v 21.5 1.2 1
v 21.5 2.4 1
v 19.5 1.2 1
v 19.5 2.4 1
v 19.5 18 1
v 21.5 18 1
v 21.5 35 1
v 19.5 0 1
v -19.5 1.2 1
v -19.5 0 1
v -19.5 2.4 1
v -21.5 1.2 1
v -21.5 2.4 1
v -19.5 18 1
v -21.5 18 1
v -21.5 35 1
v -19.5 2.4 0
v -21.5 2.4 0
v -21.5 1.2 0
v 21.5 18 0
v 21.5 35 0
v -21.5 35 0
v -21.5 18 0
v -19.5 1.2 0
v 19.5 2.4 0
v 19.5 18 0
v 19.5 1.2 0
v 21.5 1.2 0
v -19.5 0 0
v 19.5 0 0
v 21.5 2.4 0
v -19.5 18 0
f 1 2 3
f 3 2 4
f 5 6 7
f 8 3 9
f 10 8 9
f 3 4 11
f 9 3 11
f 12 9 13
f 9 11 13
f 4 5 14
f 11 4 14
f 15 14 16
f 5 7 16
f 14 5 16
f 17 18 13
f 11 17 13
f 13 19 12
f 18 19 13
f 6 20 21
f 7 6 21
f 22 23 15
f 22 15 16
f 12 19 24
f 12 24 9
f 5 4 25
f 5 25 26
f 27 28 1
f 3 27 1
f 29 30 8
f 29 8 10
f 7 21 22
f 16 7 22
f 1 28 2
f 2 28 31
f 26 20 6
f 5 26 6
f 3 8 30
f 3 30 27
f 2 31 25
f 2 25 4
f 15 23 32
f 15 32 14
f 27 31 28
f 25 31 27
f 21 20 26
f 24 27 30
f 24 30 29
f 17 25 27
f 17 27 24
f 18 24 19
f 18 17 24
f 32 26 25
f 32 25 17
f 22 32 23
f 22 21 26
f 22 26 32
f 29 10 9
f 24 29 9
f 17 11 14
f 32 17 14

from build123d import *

# Parameters (mm, degrees)
SKETCH037_W     = 21.5
SKETCH037_H     = 35
PAD014_DEPTH    = 1
SKETCH038_W     = 1.2
SKETCH038_H     = 1
SKETCH038_W_2   = 15.6
POCKET024_DEPTH = 2


with BuildPart() as part:
    # Sketch037 → Pad014 (new body)
    with BuildSketch(Plane.XY):
        with Locations((10.75, 17.5)):
            Rectangle(SKETCH037_W, SKETCH037_H)
    extrude(amount=PAD014_DEPTH)

    # Sketch038 (on Face2 of Pad014) → Pocket024 (cut)
    with BuildSketch(Plane.YZ.offset(21.5)):
        with Locations((0.6, 0.5)):
            Rectangle(SKETCH038_W, SKETCH038_H)
        with Locations((10.2, 0.5)):
            Rectangle(SKETCH038_W_2, SKETCH038_H)
    extrude(amount=-POCKET024_DEPTH, mode=Mode.SUBTRACT)

    # Mirrored: part across face of Pocket024


with BuildPart() as part_1:
    add(part.part)
    add(part.part.mirror(Plane(origin=(0, 17.5, 0.5), x_dir=(0, -1, 0), z_dir=(-1, 0, 0))))


solid = part_1.part
